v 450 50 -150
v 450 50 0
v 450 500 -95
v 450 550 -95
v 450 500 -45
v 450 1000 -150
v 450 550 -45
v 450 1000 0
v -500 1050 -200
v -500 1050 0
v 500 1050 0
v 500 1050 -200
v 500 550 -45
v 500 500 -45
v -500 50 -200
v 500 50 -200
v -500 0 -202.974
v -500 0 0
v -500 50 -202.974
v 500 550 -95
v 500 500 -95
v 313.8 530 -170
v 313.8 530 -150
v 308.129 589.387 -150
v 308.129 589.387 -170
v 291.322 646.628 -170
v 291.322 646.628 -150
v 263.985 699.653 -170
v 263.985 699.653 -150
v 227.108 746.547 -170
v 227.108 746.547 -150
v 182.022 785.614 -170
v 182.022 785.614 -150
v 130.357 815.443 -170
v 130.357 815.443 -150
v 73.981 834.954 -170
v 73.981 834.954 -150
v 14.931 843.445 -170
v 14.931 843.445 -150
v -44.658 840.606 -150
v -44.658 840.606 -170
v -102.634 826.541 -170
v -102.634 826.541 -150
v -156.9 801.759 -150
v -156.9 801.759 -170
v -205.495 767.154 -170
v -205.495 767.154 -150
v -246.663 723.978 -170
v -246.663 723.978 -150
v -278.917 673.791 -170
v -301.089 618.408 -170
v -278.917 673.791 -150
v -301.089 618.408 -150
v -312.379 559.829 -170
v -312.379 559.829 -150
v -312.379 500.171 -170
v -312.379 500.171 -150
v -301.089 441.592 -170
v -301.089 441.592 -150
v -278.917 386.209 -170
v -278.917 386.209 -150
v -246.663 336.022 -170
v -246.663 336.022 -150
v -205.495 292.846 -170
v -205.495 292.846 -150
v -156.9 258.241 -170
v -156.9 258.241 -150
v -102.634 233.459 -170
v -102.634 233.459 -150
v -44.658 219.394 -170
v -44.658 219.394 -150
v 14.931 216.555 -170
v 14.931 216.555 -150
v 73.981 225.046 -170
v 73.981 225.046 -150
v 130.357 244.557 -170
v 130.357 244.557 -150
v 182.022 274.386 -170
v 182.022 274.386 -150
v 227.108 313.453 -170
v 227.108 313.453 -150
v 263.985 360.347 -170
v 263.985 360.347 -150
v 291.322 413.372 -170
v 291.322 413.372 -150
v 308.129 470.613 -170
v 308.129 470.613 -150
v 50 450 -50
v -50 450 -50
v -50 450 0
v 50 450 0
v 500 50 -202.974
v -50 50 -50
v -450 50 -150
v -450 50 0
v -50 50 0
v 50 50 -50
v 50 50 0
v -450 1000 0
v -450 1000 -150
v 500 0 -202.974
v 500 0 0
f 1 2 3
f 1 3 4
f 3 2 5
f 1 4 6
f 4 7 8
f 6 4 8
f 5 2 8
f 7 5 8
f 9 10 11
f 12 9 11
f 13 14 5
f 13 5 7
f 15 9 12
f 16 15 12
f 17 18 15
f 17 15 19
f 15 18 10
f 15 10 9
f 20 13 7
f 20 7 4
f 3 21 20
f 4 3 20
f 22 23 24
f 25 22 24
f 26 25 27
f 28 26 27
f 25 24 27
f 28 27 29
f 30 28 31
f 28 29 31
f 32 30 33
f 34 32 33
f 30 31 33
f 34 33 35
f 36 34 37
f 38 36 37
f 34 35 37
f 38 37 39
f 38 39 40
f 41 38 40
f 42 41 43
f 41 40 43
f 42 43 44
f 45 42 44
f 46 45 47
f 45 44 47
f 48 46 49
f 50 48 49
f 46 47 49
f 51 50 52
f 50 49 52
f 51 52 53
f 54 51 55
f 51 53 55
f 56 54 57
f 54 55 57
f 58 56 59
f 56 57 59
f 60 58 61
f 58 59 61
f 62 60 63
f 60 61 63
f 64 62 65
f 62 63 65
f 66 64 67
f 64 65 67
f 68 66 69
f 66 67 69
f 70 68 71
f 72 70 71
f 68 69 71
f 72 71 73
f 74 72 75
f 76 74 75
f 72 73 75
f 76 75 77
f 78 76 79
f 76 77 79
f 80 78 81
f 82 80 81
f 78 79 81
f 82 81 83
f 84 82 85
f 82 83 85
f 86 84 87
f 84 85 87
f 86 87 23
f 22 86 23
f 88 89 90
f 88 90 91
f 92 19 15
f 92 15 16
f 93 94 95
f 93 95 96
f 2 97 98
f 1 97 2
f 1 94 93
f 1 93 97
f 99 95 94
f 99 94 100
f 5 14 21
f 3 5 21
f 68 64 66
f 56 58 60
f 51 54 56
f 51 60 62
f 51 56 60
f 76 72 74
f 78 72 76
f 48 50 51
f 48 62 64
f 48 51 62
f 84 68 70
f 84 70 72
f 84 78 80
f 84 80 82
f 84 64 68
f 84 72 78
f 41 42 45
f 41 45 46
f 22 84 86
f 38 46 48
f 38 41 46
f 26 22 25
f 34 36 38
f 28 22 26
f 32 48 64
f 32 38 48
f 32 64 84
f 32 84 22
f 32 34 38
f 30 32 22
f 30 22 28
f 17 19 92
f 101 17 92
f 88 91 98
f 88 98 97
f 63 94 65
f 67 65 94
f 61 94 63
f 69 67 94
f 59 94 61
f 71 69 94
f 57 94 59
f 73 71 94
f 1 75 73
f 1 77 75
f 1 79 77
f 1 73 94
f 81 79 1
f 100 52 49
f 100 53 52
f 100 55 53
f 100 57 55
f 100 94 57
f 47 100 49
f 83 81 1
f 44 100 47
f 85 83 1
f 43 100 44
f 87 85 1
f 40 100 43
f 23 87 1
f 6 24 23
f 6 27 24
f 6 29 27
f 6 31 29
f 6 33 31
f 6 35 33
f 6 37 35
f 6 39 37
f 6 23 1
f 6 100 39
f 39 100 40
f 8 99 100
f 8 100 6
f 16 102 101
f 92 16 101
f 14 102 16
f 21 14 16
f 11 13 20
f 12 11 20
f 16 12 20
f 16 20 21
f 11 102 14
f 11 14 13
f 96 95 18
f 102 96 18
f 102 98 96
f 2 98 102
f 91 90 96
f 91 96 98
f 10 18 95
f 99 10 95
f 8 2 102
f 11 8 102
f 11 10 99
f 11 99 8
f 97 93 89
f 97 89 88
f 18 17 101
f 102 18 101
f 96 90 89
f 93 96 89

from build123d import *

# Parameters (mm, degrees)
SKETCH1_W           = 1500
SKETCH1_H           = 1000
BOSS_EXTRUDE1_DEPTH = 50
SKETCH2_W           = 1000
SKETCH2_H           = 1000
BOSS_EXTRUDE2_DEPTH = 200
SKETCH3_W           = 900
SKETCH3_H           = 950
CUT_EXTRUDE1_DEPTH  = 150
SKETCH4_W           = 100
SKETCH4_H           = 50
BOSS_EXTRUDE3_DEPTH = 400
SKETCH5_W           = 50
SKETCH5_H           = 50
CUT_EXTRUDE2_DEPTH  = 110
SKETCH7_W           = 1500
SKETCH7_H           = 500
CUT_EXTRUDE3_DEPTH  = 1347.291201784
SKETCH8_W           = 1500
SKETCH8_H           = 297.02623805
CUT_EXTRUDE4_DEPTH  = 1347.291201784
SKETCH9_W           = 250
SKETCH9_H           = 202.97376195
CUT_EXTRUDE5_DEPTH  = 1267.372120682
SKETCH10_R          = 313.8
CUT_EXTRUDE6_DEPTH  = 20


with BuildPart() as part:
    # Sketch1 → Boss-Extrude1 (new body)
    with BuildSketch(Plane(origin=(0, 0, 0), x_dir=(1, 0, 0), z_dir=(0, 1, 0))):
        Rectangle(SKETCH1_W, SKETCH1_H)
    extrude(amount=BOSS_EXTRUDE1_DEPTH)

    # Sketch2 → Boss-Extrude2 (add)
    with BuildSketch(Plane.XY):
        with Locations((0, 550)):
            Rectangle(SKETCH2_W, SKETCH2_H)
    extrude(amount=-BOSS_EXTRUDE2_DEPTH)

    # Sketch3 → Cut-Extrude1 (cut)
    with BuildSketch(Plane.XY):
        with Locations((0, 525)):
            Rectangle(SKETCH3_W, SKETCH3_H)
    extrude(amount=-CUT_EXTRUDE1_DEPTH, mode=Mode.SUBTRACT)

    # Sketch4 → Boss-Extrude3 (add)
    with BuildSketch(Plane(origin=(0, 50, 0), x_dir=(1, 0, 0), z_dir=(0, 1, 0))):
        with Locations((0, 25)):
            Rectangle(SKETCH4_W, SKETCH4_H)
    extrude(amount=BOSS_EXTRUDE3_DEPTH)

    # Sketch5 → Cut-Extrude2 (cut)
    with BuildSketch(Plane(origin=(500, 0, 0), x_dir=(0, 0, -1), z_dir=(1, 0, 0))):
        with Locations((70, 525)):
            Rectangle(SKETCH5_W, SKETCH5_H)
    extrude(amount=-CUT_EXTRUDE2_DEPTH, mode=Mode.SUBTRACT)

    # Sketch7 → Cut-Extrude3 (cut, through all)
    with BuildSketch(Plane(origin=(0, 50, 0), x_dir=(1, 0, 0), z_dir=(0, 1, 0))):
        with Locations((0, -250)):
            Rectangle(SKETCH7_W, SKETCH7_H)
    extrude(amount=-CUT_EXTRUDE3_DEPTH, mode=Mode.SUBTRACT)

    # Sketch8 → Cut-Extrude4 (cut, through all)
    with BuildSketch(Plane(origin=(0, 50, 0), x_dir=(1, 0, 0), z_dir=(0, 1, 0))):
        with Locations((0, 351.486880975)):
            Rectangle(SKETCH8_W, SKETCH8_H)
    extrude(amount=-CUT_EXTRUDE4_DEPTH, mode=Mode.SUBTRACT)

    # Sketch9 → Cut-Extrude5 (cut, through all)
    with BuildSketch(Plane(origin=(0, 50, 0), x_dir=(1, 0, 0), z_dir=(0, 1, 0))):
        with Locations((-625, 101.486880975)):
            Rectangle(SKETCH9_W, SKETCH9_H)
        with Locations((625, 101.486880975)):
            Rectangle(SKETCH9_W, SKETCH9_H)
    extrude(amount=-CUT_EXTRUDE5_DEPTH, mode=Mode.SUBTRACT)

    # Sketch10 → Cut-Extrude6 (cut)
    with BuildSketch(Plane.XY.offset(-150)):
        with Locations((0, 530)):
            Circle(SKETCH10_R)
    extrude(amount=-CUT_EXTRUDE6_DEPTH, mode=Mode.SUBTRACT)


solid = part.part
